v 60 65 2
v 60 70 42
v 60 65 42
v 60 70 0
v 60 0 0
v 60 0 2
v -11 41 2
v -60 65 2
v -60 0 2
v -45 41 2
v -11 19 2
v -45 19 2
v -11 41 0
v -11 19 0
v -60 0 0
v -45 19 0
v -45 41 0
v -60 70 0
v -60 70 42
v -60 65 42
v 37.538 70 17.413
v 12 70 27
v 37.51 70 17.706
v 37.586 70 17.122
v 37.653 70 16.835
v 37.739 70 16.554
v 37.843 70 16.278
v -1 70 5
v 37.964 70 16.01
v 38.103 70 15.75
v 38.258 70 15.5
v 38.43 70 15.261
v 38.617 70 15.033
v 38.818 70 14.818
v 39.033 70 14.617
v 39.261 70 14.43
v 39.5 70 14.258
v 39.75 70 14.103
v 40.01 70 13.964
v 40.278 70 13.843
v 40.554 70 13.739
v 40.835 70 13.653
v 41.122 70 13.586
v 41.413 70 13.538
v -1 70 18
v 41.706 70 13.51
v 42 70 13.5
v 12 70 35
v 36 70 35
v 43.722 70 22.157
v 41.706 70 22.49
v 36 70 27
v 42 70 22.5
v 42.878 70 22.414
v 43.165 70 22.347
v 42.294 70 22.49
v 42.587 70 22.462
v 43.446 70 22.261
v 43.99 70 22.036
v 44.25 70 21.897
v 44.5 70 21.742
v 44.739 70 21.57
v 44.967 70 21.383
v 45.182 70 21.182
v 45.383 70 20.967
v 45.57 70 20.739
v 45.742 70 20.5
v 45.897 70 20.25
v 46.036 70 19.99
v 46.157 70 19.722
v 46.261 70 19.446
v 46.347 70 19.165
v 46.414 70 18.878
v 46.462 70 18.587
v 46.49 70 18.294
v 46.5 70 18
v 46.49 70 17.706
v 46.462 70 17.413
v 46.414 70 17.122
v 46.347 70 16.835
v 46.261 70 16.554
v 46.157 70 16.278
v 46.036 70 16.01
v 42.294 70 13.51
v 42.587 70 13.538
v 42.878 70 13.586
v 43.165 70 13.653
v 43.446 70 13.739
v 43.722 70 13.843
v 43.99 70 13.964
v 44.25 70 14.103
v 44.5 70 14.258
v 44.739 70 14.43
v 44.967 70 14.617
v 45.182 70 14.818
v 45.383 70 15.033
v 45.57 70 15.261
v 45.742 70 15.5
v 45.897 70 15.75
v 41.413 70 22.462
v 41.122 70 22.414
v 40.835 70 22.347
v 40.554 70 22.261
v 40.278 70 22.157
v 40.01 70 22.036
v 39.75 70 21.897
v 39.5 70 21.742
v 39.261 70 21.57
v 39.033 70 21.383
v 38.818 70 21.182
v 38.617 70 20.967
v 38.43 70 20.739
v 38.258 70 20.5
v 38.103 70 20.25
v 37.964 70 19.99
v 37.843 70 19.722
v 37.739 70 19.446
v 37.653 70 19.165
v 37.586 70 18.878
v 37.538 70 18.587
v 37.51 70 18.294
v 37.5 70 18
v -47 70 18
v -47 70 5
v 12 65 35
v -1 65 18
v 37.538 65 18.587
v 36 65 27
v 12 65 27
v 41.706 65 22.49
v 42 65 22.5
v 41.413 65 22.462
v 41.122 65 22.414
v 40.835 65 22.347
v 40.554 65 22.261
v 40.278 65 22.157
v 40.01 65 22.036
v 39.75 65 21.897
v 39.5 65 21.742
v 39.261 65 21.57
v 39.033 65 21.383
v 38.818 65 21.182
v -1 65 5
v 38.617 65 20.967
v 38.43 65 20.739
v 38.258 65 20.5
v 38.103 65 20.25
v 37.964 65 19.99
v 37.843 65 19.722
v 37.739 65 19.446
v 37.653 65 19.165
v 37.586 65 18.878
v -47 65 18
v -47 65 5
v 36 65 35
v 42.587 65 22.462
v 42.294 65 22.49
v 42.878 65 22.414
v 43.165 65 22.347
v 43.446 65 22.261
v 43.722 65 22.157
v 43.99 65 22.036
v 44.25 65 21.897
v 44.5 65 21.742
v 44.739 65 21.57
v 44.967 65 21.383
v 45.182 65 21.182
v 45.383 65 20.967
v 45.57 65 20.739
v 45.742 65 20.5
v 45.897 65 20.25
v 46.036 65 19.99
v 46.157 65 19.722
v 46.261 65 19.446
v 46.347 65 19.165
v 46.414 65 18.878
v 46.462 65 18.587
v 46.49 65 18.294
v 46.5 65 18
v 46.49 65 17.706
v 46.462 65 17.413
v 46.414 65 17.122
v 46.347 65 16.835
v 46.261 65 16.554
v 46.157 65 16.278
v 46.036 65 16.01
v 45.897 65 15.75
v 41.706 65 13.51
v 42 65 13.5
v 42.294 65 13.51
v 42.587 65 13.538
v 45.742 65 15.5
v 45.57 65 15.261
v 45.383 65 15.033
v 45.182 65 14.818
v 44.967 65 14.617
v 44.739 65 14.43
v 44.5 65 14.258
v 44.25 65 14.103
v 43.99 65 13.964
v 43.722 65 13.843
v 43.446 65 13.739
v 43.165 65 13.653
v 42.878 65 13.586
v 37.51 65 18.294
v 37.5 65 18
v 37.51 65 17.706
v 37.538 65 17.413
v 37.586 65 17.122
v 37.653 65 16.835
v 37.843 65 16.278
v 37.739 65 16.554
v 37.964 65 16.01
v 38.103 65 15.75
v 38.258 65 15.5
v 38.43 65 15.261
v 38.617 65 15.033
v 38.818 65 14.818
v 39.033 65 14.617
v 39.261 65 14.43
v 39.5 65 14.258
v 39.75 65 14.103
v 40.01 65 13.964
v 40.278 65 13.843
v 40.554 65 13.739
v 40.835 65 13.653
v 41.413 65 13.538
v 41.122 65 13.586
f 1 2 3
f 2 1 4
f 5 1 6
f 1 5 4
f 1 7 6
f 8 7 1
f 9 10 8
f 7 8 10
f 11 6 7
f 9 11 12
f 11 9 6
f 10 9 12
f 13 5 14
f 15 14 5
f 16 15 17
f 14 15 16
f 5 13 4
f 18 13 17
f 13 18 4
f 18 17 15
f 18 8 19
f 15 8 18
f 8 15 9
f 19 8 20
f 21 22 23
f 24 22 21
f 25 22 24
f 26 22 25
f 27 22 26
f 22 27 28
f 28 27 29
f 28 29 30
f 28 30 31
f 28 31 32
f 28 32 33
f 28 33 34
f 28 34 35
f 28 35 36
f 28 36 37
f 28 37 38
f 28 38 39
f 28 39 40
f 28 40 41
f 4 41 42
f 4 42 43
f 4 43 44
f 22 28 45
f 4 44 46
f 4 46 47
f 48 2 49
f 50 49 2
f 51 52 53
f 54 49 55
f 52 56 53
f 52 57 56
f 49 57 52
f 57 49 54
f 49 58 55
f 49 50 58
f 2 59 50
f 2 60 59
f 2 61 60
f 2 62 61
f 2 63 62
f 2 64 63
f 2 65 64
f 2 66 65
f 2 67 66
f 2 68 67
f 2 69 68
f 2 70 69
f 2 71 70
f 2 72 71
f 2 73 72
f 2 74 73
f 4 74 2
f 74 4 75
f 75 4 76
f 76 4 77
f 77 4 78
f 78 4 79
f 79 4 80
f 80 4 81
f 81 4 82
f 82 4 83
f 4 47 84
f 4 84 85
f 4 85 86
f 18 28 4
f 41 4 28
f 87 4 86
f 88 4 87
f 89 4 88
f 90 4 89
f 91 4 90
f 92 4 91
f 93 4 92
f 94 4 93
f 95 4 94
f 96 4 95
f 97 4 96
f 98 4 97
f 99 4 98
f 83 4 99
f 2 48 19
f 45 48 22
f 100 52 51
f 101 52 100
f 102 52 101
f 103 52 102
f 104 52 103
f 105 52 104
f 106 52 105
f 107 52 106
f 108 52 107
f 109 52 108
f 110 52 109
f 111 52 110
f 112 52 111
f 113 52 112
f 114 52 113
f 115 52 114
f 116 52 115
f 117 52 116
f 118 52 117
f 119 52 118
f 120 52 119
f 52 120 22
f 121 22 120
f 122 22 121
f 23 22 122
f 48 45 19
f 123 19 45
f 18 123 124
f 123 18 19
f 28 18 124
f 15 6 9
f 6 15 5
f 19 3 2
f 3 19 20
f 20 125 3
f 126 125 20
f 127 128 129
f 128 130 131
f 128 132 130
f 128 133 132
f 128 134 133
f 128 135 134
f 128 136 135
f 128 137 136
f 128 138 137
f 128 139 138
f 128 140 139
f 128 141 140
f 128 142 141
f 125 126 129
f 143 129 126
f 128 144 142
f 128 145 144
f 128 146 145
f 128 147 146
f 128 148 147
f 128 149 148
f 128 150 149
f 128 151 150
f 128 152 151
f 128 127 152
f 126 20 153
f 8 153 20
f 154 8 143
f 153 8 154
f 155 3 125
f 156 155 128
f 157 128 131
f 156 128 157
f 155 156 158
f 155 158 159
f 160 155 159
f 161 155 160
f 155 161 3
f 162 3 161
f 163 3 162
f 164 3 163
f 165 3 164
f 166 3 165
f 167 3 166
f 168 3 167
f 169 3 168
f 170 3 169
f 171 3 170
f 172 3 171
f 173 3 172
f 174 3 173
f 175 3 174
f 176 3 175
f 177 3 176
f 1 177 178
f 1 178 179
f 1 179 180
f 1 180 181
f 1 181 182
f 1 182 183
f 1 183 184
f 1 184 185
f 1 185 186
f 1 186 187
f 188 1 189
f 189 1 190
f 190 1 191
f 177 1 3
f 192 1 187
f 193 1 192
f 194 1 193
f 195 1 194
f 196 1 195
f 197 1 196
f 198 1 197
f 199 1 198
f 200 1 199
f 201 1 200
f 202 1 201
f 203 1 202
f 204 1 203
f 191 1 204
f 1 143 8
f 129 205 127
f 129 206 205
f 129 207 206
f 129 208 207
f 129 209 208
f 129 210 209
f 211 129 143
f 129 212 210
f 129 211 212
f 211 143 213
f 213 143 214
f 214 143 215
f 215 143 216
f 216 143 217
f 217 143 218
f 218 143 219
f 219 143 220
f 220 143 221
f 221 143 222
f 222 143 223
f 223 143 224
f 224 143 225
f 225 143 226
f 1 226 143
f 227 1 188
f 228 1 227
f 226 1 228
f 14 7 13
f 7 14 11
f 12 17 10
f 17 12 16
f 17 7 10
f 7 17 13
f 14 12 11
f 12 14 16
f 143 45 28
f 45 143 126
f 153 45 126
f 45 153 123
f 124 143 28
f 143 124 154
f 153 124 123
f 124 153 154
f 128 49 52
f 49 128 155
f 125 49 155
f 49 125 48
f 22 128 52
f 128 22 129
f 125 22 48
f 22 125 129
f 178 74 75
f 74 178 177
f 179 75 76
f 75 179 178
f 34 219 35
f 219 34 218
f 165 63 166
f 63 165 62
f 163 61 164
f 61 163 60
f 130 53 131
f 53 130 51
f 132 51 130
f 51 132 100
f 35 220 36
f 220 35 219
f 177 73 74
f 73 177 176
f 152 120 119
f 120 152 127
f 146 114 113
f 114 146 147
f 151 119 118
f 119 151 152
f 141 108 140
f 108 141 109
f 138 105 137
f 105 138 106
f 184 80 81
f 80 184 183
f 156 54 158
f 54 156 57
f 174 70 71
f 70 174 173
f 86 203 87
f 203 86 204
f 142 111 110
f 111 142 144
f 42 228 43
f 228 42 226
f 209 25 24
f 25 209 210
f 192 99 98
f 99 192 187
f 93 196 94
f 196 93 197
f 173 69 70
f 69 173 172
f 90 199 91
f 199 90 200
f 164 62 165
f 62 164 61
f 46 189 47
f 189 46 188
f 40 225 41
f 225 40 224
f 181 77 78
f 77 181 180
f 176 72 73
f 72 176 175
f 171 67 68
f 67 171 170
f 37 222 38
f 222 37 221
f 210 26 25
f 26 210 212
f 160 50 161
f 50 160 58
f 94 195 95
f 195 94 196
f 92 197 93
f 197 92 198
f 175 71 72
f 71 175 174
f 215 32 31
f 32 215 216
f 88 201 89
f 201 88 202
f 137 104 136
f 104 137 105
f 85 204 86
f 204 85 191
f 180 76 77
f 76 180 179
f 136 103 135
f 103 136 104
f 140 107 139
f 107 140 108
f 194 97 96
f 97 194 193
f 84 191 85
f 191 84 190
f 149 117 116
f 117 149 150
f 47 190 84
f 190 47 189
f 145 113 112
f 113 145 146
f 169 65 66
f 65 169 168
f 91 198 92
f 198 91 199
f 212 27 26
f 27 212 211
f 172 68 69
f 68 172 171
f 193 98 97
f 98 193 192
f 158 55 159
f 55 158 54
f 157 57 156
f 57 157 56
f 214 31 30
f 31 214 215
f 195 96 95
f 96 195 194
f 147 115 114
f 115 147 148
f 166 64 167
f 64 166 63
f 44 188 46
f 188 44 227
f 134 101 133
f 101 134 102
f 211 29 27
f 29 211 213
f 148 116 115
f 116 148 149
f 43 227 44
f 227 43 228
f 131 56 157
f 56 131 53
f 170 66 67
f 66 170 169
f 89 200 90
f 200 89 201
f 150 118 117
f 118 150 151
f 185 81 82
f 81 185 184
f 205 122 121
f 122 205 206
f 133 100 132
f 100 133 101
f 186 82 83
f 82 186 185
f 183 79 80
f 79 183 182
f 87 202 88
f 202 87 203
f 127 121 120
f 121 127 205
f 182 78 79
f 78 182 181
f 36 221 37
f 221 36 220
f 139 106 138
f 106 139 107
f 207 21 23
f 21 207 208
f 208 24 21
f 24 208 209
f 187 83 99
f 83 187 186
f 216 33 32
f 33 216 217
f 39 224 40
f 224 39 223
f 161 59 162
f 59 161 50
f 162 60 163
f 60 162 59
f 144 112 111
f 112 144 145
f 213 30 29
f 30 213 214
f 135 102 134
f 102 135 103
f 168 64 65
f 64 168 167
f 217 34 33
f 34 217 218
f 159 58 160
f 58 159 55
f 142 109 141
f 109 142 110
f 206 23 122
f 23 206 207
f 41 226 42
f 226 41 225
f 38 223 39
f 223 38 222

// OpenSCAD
// Units: millimeters

// Parameters
$fn = 96;
eps = 0.2;

// Base sheet
base_length = 120;
base_depth = 70;
base_thickness = 2;

// Upright edge wall
wall_length = base_length;
wall_thickness = 5;
wall_height = 40;
wall_overlap = 0.05;

// Floor through-opening
floor_cut_width = 34;
floor_cut_depth = 22;
floor_cut_x = -28;
floor_cut_y = 30;

// Lower wall rectangular through-opening
lower_wall_cut_width = 46;
lower_wall_cut_height = 13;
lower_wall_cut_x = -24;
lower_wall_cut_z_bottom = 3;

// Upper wall rectangular through-opening
upper_wall_cut_width = 24;
upper_wall_cut_height = 8;
upper_wall_cut_x = 24;
upper_wall_cut_z_bottom = 25;

// Round wall through-hole
wall_hole_diameter = 9;
wall_hole_x = 42;
wall_hole_z_center = 16;

// Derived positions
wall_y_center = base_depth - wall_thickness / 2;
wall_z_bottom = base_thickness - wall_overlap;
wall_total_height = wall_height + wall_overlap;

// Thin floor plate
module base_sheet() {
    translate([0, base_depth / 2, base_thickness / 2])
        cube([base_length, base_depth, base_thickness], center=true);
}

// Solid wall along rear edge
module upright_wall() {
    translate([0, wall_y_center, wall_z_bottom + wall_total_height / 2])
        cube([wall_length, wall_thickness, wall_total_height], center=true);
}

// Main solid before subtractive cuts
module solid_body() {
    union() {
        base_sheet();
        upright_wall();
    }
}

// Rectangular opening through horizontal sheet
module floor_rect_cut() {
    translate([floor_cut_x, floor_cut_y, base_thickness / 2])
        cube([floor_cut_width, floor_cut_depth, base_thickness + 2 * eps], center=true);
}

// Rectangular opening through wall thickness
module wall_rect_cut(x, z_bottom, w, h) {
    translate([x, wall_y_center, base_thickness + z_bottom + h / 2])
        cube([w, wall_thickness + 2 * eps, h], center=true);
}

// Round opening through wall thickness
module wall_round_hole() {
    translate([wall_hole_x, wall_y_center, base_thickness + wall_hole_z_center])
        rotate([90, 0, 0])
            cylinder(h=wall_thickness + 2 * eps, d=wall_hole_diameter, center=true);
}

// Final model with all voids removed
difference() {
    solid_body();

    // Floor cut
    floor_rect_cut();

    // Lower wall cut
    wall_rect_cut(
        lower_wall_cut_x,
        lower_wall_cut_z_bottom,
        lower_wall_cut_width,
        lower_wall_cut_height
    );

    // Upper wall cut
    wall_rect_cut(
        upper_wall_cut_x,
        upper_wall_cut_z_bottom,
        upper_wall_cut_width,
        upper_wall_cut_height
    );

    // Round wall hole
    wall_round_hole();
}
